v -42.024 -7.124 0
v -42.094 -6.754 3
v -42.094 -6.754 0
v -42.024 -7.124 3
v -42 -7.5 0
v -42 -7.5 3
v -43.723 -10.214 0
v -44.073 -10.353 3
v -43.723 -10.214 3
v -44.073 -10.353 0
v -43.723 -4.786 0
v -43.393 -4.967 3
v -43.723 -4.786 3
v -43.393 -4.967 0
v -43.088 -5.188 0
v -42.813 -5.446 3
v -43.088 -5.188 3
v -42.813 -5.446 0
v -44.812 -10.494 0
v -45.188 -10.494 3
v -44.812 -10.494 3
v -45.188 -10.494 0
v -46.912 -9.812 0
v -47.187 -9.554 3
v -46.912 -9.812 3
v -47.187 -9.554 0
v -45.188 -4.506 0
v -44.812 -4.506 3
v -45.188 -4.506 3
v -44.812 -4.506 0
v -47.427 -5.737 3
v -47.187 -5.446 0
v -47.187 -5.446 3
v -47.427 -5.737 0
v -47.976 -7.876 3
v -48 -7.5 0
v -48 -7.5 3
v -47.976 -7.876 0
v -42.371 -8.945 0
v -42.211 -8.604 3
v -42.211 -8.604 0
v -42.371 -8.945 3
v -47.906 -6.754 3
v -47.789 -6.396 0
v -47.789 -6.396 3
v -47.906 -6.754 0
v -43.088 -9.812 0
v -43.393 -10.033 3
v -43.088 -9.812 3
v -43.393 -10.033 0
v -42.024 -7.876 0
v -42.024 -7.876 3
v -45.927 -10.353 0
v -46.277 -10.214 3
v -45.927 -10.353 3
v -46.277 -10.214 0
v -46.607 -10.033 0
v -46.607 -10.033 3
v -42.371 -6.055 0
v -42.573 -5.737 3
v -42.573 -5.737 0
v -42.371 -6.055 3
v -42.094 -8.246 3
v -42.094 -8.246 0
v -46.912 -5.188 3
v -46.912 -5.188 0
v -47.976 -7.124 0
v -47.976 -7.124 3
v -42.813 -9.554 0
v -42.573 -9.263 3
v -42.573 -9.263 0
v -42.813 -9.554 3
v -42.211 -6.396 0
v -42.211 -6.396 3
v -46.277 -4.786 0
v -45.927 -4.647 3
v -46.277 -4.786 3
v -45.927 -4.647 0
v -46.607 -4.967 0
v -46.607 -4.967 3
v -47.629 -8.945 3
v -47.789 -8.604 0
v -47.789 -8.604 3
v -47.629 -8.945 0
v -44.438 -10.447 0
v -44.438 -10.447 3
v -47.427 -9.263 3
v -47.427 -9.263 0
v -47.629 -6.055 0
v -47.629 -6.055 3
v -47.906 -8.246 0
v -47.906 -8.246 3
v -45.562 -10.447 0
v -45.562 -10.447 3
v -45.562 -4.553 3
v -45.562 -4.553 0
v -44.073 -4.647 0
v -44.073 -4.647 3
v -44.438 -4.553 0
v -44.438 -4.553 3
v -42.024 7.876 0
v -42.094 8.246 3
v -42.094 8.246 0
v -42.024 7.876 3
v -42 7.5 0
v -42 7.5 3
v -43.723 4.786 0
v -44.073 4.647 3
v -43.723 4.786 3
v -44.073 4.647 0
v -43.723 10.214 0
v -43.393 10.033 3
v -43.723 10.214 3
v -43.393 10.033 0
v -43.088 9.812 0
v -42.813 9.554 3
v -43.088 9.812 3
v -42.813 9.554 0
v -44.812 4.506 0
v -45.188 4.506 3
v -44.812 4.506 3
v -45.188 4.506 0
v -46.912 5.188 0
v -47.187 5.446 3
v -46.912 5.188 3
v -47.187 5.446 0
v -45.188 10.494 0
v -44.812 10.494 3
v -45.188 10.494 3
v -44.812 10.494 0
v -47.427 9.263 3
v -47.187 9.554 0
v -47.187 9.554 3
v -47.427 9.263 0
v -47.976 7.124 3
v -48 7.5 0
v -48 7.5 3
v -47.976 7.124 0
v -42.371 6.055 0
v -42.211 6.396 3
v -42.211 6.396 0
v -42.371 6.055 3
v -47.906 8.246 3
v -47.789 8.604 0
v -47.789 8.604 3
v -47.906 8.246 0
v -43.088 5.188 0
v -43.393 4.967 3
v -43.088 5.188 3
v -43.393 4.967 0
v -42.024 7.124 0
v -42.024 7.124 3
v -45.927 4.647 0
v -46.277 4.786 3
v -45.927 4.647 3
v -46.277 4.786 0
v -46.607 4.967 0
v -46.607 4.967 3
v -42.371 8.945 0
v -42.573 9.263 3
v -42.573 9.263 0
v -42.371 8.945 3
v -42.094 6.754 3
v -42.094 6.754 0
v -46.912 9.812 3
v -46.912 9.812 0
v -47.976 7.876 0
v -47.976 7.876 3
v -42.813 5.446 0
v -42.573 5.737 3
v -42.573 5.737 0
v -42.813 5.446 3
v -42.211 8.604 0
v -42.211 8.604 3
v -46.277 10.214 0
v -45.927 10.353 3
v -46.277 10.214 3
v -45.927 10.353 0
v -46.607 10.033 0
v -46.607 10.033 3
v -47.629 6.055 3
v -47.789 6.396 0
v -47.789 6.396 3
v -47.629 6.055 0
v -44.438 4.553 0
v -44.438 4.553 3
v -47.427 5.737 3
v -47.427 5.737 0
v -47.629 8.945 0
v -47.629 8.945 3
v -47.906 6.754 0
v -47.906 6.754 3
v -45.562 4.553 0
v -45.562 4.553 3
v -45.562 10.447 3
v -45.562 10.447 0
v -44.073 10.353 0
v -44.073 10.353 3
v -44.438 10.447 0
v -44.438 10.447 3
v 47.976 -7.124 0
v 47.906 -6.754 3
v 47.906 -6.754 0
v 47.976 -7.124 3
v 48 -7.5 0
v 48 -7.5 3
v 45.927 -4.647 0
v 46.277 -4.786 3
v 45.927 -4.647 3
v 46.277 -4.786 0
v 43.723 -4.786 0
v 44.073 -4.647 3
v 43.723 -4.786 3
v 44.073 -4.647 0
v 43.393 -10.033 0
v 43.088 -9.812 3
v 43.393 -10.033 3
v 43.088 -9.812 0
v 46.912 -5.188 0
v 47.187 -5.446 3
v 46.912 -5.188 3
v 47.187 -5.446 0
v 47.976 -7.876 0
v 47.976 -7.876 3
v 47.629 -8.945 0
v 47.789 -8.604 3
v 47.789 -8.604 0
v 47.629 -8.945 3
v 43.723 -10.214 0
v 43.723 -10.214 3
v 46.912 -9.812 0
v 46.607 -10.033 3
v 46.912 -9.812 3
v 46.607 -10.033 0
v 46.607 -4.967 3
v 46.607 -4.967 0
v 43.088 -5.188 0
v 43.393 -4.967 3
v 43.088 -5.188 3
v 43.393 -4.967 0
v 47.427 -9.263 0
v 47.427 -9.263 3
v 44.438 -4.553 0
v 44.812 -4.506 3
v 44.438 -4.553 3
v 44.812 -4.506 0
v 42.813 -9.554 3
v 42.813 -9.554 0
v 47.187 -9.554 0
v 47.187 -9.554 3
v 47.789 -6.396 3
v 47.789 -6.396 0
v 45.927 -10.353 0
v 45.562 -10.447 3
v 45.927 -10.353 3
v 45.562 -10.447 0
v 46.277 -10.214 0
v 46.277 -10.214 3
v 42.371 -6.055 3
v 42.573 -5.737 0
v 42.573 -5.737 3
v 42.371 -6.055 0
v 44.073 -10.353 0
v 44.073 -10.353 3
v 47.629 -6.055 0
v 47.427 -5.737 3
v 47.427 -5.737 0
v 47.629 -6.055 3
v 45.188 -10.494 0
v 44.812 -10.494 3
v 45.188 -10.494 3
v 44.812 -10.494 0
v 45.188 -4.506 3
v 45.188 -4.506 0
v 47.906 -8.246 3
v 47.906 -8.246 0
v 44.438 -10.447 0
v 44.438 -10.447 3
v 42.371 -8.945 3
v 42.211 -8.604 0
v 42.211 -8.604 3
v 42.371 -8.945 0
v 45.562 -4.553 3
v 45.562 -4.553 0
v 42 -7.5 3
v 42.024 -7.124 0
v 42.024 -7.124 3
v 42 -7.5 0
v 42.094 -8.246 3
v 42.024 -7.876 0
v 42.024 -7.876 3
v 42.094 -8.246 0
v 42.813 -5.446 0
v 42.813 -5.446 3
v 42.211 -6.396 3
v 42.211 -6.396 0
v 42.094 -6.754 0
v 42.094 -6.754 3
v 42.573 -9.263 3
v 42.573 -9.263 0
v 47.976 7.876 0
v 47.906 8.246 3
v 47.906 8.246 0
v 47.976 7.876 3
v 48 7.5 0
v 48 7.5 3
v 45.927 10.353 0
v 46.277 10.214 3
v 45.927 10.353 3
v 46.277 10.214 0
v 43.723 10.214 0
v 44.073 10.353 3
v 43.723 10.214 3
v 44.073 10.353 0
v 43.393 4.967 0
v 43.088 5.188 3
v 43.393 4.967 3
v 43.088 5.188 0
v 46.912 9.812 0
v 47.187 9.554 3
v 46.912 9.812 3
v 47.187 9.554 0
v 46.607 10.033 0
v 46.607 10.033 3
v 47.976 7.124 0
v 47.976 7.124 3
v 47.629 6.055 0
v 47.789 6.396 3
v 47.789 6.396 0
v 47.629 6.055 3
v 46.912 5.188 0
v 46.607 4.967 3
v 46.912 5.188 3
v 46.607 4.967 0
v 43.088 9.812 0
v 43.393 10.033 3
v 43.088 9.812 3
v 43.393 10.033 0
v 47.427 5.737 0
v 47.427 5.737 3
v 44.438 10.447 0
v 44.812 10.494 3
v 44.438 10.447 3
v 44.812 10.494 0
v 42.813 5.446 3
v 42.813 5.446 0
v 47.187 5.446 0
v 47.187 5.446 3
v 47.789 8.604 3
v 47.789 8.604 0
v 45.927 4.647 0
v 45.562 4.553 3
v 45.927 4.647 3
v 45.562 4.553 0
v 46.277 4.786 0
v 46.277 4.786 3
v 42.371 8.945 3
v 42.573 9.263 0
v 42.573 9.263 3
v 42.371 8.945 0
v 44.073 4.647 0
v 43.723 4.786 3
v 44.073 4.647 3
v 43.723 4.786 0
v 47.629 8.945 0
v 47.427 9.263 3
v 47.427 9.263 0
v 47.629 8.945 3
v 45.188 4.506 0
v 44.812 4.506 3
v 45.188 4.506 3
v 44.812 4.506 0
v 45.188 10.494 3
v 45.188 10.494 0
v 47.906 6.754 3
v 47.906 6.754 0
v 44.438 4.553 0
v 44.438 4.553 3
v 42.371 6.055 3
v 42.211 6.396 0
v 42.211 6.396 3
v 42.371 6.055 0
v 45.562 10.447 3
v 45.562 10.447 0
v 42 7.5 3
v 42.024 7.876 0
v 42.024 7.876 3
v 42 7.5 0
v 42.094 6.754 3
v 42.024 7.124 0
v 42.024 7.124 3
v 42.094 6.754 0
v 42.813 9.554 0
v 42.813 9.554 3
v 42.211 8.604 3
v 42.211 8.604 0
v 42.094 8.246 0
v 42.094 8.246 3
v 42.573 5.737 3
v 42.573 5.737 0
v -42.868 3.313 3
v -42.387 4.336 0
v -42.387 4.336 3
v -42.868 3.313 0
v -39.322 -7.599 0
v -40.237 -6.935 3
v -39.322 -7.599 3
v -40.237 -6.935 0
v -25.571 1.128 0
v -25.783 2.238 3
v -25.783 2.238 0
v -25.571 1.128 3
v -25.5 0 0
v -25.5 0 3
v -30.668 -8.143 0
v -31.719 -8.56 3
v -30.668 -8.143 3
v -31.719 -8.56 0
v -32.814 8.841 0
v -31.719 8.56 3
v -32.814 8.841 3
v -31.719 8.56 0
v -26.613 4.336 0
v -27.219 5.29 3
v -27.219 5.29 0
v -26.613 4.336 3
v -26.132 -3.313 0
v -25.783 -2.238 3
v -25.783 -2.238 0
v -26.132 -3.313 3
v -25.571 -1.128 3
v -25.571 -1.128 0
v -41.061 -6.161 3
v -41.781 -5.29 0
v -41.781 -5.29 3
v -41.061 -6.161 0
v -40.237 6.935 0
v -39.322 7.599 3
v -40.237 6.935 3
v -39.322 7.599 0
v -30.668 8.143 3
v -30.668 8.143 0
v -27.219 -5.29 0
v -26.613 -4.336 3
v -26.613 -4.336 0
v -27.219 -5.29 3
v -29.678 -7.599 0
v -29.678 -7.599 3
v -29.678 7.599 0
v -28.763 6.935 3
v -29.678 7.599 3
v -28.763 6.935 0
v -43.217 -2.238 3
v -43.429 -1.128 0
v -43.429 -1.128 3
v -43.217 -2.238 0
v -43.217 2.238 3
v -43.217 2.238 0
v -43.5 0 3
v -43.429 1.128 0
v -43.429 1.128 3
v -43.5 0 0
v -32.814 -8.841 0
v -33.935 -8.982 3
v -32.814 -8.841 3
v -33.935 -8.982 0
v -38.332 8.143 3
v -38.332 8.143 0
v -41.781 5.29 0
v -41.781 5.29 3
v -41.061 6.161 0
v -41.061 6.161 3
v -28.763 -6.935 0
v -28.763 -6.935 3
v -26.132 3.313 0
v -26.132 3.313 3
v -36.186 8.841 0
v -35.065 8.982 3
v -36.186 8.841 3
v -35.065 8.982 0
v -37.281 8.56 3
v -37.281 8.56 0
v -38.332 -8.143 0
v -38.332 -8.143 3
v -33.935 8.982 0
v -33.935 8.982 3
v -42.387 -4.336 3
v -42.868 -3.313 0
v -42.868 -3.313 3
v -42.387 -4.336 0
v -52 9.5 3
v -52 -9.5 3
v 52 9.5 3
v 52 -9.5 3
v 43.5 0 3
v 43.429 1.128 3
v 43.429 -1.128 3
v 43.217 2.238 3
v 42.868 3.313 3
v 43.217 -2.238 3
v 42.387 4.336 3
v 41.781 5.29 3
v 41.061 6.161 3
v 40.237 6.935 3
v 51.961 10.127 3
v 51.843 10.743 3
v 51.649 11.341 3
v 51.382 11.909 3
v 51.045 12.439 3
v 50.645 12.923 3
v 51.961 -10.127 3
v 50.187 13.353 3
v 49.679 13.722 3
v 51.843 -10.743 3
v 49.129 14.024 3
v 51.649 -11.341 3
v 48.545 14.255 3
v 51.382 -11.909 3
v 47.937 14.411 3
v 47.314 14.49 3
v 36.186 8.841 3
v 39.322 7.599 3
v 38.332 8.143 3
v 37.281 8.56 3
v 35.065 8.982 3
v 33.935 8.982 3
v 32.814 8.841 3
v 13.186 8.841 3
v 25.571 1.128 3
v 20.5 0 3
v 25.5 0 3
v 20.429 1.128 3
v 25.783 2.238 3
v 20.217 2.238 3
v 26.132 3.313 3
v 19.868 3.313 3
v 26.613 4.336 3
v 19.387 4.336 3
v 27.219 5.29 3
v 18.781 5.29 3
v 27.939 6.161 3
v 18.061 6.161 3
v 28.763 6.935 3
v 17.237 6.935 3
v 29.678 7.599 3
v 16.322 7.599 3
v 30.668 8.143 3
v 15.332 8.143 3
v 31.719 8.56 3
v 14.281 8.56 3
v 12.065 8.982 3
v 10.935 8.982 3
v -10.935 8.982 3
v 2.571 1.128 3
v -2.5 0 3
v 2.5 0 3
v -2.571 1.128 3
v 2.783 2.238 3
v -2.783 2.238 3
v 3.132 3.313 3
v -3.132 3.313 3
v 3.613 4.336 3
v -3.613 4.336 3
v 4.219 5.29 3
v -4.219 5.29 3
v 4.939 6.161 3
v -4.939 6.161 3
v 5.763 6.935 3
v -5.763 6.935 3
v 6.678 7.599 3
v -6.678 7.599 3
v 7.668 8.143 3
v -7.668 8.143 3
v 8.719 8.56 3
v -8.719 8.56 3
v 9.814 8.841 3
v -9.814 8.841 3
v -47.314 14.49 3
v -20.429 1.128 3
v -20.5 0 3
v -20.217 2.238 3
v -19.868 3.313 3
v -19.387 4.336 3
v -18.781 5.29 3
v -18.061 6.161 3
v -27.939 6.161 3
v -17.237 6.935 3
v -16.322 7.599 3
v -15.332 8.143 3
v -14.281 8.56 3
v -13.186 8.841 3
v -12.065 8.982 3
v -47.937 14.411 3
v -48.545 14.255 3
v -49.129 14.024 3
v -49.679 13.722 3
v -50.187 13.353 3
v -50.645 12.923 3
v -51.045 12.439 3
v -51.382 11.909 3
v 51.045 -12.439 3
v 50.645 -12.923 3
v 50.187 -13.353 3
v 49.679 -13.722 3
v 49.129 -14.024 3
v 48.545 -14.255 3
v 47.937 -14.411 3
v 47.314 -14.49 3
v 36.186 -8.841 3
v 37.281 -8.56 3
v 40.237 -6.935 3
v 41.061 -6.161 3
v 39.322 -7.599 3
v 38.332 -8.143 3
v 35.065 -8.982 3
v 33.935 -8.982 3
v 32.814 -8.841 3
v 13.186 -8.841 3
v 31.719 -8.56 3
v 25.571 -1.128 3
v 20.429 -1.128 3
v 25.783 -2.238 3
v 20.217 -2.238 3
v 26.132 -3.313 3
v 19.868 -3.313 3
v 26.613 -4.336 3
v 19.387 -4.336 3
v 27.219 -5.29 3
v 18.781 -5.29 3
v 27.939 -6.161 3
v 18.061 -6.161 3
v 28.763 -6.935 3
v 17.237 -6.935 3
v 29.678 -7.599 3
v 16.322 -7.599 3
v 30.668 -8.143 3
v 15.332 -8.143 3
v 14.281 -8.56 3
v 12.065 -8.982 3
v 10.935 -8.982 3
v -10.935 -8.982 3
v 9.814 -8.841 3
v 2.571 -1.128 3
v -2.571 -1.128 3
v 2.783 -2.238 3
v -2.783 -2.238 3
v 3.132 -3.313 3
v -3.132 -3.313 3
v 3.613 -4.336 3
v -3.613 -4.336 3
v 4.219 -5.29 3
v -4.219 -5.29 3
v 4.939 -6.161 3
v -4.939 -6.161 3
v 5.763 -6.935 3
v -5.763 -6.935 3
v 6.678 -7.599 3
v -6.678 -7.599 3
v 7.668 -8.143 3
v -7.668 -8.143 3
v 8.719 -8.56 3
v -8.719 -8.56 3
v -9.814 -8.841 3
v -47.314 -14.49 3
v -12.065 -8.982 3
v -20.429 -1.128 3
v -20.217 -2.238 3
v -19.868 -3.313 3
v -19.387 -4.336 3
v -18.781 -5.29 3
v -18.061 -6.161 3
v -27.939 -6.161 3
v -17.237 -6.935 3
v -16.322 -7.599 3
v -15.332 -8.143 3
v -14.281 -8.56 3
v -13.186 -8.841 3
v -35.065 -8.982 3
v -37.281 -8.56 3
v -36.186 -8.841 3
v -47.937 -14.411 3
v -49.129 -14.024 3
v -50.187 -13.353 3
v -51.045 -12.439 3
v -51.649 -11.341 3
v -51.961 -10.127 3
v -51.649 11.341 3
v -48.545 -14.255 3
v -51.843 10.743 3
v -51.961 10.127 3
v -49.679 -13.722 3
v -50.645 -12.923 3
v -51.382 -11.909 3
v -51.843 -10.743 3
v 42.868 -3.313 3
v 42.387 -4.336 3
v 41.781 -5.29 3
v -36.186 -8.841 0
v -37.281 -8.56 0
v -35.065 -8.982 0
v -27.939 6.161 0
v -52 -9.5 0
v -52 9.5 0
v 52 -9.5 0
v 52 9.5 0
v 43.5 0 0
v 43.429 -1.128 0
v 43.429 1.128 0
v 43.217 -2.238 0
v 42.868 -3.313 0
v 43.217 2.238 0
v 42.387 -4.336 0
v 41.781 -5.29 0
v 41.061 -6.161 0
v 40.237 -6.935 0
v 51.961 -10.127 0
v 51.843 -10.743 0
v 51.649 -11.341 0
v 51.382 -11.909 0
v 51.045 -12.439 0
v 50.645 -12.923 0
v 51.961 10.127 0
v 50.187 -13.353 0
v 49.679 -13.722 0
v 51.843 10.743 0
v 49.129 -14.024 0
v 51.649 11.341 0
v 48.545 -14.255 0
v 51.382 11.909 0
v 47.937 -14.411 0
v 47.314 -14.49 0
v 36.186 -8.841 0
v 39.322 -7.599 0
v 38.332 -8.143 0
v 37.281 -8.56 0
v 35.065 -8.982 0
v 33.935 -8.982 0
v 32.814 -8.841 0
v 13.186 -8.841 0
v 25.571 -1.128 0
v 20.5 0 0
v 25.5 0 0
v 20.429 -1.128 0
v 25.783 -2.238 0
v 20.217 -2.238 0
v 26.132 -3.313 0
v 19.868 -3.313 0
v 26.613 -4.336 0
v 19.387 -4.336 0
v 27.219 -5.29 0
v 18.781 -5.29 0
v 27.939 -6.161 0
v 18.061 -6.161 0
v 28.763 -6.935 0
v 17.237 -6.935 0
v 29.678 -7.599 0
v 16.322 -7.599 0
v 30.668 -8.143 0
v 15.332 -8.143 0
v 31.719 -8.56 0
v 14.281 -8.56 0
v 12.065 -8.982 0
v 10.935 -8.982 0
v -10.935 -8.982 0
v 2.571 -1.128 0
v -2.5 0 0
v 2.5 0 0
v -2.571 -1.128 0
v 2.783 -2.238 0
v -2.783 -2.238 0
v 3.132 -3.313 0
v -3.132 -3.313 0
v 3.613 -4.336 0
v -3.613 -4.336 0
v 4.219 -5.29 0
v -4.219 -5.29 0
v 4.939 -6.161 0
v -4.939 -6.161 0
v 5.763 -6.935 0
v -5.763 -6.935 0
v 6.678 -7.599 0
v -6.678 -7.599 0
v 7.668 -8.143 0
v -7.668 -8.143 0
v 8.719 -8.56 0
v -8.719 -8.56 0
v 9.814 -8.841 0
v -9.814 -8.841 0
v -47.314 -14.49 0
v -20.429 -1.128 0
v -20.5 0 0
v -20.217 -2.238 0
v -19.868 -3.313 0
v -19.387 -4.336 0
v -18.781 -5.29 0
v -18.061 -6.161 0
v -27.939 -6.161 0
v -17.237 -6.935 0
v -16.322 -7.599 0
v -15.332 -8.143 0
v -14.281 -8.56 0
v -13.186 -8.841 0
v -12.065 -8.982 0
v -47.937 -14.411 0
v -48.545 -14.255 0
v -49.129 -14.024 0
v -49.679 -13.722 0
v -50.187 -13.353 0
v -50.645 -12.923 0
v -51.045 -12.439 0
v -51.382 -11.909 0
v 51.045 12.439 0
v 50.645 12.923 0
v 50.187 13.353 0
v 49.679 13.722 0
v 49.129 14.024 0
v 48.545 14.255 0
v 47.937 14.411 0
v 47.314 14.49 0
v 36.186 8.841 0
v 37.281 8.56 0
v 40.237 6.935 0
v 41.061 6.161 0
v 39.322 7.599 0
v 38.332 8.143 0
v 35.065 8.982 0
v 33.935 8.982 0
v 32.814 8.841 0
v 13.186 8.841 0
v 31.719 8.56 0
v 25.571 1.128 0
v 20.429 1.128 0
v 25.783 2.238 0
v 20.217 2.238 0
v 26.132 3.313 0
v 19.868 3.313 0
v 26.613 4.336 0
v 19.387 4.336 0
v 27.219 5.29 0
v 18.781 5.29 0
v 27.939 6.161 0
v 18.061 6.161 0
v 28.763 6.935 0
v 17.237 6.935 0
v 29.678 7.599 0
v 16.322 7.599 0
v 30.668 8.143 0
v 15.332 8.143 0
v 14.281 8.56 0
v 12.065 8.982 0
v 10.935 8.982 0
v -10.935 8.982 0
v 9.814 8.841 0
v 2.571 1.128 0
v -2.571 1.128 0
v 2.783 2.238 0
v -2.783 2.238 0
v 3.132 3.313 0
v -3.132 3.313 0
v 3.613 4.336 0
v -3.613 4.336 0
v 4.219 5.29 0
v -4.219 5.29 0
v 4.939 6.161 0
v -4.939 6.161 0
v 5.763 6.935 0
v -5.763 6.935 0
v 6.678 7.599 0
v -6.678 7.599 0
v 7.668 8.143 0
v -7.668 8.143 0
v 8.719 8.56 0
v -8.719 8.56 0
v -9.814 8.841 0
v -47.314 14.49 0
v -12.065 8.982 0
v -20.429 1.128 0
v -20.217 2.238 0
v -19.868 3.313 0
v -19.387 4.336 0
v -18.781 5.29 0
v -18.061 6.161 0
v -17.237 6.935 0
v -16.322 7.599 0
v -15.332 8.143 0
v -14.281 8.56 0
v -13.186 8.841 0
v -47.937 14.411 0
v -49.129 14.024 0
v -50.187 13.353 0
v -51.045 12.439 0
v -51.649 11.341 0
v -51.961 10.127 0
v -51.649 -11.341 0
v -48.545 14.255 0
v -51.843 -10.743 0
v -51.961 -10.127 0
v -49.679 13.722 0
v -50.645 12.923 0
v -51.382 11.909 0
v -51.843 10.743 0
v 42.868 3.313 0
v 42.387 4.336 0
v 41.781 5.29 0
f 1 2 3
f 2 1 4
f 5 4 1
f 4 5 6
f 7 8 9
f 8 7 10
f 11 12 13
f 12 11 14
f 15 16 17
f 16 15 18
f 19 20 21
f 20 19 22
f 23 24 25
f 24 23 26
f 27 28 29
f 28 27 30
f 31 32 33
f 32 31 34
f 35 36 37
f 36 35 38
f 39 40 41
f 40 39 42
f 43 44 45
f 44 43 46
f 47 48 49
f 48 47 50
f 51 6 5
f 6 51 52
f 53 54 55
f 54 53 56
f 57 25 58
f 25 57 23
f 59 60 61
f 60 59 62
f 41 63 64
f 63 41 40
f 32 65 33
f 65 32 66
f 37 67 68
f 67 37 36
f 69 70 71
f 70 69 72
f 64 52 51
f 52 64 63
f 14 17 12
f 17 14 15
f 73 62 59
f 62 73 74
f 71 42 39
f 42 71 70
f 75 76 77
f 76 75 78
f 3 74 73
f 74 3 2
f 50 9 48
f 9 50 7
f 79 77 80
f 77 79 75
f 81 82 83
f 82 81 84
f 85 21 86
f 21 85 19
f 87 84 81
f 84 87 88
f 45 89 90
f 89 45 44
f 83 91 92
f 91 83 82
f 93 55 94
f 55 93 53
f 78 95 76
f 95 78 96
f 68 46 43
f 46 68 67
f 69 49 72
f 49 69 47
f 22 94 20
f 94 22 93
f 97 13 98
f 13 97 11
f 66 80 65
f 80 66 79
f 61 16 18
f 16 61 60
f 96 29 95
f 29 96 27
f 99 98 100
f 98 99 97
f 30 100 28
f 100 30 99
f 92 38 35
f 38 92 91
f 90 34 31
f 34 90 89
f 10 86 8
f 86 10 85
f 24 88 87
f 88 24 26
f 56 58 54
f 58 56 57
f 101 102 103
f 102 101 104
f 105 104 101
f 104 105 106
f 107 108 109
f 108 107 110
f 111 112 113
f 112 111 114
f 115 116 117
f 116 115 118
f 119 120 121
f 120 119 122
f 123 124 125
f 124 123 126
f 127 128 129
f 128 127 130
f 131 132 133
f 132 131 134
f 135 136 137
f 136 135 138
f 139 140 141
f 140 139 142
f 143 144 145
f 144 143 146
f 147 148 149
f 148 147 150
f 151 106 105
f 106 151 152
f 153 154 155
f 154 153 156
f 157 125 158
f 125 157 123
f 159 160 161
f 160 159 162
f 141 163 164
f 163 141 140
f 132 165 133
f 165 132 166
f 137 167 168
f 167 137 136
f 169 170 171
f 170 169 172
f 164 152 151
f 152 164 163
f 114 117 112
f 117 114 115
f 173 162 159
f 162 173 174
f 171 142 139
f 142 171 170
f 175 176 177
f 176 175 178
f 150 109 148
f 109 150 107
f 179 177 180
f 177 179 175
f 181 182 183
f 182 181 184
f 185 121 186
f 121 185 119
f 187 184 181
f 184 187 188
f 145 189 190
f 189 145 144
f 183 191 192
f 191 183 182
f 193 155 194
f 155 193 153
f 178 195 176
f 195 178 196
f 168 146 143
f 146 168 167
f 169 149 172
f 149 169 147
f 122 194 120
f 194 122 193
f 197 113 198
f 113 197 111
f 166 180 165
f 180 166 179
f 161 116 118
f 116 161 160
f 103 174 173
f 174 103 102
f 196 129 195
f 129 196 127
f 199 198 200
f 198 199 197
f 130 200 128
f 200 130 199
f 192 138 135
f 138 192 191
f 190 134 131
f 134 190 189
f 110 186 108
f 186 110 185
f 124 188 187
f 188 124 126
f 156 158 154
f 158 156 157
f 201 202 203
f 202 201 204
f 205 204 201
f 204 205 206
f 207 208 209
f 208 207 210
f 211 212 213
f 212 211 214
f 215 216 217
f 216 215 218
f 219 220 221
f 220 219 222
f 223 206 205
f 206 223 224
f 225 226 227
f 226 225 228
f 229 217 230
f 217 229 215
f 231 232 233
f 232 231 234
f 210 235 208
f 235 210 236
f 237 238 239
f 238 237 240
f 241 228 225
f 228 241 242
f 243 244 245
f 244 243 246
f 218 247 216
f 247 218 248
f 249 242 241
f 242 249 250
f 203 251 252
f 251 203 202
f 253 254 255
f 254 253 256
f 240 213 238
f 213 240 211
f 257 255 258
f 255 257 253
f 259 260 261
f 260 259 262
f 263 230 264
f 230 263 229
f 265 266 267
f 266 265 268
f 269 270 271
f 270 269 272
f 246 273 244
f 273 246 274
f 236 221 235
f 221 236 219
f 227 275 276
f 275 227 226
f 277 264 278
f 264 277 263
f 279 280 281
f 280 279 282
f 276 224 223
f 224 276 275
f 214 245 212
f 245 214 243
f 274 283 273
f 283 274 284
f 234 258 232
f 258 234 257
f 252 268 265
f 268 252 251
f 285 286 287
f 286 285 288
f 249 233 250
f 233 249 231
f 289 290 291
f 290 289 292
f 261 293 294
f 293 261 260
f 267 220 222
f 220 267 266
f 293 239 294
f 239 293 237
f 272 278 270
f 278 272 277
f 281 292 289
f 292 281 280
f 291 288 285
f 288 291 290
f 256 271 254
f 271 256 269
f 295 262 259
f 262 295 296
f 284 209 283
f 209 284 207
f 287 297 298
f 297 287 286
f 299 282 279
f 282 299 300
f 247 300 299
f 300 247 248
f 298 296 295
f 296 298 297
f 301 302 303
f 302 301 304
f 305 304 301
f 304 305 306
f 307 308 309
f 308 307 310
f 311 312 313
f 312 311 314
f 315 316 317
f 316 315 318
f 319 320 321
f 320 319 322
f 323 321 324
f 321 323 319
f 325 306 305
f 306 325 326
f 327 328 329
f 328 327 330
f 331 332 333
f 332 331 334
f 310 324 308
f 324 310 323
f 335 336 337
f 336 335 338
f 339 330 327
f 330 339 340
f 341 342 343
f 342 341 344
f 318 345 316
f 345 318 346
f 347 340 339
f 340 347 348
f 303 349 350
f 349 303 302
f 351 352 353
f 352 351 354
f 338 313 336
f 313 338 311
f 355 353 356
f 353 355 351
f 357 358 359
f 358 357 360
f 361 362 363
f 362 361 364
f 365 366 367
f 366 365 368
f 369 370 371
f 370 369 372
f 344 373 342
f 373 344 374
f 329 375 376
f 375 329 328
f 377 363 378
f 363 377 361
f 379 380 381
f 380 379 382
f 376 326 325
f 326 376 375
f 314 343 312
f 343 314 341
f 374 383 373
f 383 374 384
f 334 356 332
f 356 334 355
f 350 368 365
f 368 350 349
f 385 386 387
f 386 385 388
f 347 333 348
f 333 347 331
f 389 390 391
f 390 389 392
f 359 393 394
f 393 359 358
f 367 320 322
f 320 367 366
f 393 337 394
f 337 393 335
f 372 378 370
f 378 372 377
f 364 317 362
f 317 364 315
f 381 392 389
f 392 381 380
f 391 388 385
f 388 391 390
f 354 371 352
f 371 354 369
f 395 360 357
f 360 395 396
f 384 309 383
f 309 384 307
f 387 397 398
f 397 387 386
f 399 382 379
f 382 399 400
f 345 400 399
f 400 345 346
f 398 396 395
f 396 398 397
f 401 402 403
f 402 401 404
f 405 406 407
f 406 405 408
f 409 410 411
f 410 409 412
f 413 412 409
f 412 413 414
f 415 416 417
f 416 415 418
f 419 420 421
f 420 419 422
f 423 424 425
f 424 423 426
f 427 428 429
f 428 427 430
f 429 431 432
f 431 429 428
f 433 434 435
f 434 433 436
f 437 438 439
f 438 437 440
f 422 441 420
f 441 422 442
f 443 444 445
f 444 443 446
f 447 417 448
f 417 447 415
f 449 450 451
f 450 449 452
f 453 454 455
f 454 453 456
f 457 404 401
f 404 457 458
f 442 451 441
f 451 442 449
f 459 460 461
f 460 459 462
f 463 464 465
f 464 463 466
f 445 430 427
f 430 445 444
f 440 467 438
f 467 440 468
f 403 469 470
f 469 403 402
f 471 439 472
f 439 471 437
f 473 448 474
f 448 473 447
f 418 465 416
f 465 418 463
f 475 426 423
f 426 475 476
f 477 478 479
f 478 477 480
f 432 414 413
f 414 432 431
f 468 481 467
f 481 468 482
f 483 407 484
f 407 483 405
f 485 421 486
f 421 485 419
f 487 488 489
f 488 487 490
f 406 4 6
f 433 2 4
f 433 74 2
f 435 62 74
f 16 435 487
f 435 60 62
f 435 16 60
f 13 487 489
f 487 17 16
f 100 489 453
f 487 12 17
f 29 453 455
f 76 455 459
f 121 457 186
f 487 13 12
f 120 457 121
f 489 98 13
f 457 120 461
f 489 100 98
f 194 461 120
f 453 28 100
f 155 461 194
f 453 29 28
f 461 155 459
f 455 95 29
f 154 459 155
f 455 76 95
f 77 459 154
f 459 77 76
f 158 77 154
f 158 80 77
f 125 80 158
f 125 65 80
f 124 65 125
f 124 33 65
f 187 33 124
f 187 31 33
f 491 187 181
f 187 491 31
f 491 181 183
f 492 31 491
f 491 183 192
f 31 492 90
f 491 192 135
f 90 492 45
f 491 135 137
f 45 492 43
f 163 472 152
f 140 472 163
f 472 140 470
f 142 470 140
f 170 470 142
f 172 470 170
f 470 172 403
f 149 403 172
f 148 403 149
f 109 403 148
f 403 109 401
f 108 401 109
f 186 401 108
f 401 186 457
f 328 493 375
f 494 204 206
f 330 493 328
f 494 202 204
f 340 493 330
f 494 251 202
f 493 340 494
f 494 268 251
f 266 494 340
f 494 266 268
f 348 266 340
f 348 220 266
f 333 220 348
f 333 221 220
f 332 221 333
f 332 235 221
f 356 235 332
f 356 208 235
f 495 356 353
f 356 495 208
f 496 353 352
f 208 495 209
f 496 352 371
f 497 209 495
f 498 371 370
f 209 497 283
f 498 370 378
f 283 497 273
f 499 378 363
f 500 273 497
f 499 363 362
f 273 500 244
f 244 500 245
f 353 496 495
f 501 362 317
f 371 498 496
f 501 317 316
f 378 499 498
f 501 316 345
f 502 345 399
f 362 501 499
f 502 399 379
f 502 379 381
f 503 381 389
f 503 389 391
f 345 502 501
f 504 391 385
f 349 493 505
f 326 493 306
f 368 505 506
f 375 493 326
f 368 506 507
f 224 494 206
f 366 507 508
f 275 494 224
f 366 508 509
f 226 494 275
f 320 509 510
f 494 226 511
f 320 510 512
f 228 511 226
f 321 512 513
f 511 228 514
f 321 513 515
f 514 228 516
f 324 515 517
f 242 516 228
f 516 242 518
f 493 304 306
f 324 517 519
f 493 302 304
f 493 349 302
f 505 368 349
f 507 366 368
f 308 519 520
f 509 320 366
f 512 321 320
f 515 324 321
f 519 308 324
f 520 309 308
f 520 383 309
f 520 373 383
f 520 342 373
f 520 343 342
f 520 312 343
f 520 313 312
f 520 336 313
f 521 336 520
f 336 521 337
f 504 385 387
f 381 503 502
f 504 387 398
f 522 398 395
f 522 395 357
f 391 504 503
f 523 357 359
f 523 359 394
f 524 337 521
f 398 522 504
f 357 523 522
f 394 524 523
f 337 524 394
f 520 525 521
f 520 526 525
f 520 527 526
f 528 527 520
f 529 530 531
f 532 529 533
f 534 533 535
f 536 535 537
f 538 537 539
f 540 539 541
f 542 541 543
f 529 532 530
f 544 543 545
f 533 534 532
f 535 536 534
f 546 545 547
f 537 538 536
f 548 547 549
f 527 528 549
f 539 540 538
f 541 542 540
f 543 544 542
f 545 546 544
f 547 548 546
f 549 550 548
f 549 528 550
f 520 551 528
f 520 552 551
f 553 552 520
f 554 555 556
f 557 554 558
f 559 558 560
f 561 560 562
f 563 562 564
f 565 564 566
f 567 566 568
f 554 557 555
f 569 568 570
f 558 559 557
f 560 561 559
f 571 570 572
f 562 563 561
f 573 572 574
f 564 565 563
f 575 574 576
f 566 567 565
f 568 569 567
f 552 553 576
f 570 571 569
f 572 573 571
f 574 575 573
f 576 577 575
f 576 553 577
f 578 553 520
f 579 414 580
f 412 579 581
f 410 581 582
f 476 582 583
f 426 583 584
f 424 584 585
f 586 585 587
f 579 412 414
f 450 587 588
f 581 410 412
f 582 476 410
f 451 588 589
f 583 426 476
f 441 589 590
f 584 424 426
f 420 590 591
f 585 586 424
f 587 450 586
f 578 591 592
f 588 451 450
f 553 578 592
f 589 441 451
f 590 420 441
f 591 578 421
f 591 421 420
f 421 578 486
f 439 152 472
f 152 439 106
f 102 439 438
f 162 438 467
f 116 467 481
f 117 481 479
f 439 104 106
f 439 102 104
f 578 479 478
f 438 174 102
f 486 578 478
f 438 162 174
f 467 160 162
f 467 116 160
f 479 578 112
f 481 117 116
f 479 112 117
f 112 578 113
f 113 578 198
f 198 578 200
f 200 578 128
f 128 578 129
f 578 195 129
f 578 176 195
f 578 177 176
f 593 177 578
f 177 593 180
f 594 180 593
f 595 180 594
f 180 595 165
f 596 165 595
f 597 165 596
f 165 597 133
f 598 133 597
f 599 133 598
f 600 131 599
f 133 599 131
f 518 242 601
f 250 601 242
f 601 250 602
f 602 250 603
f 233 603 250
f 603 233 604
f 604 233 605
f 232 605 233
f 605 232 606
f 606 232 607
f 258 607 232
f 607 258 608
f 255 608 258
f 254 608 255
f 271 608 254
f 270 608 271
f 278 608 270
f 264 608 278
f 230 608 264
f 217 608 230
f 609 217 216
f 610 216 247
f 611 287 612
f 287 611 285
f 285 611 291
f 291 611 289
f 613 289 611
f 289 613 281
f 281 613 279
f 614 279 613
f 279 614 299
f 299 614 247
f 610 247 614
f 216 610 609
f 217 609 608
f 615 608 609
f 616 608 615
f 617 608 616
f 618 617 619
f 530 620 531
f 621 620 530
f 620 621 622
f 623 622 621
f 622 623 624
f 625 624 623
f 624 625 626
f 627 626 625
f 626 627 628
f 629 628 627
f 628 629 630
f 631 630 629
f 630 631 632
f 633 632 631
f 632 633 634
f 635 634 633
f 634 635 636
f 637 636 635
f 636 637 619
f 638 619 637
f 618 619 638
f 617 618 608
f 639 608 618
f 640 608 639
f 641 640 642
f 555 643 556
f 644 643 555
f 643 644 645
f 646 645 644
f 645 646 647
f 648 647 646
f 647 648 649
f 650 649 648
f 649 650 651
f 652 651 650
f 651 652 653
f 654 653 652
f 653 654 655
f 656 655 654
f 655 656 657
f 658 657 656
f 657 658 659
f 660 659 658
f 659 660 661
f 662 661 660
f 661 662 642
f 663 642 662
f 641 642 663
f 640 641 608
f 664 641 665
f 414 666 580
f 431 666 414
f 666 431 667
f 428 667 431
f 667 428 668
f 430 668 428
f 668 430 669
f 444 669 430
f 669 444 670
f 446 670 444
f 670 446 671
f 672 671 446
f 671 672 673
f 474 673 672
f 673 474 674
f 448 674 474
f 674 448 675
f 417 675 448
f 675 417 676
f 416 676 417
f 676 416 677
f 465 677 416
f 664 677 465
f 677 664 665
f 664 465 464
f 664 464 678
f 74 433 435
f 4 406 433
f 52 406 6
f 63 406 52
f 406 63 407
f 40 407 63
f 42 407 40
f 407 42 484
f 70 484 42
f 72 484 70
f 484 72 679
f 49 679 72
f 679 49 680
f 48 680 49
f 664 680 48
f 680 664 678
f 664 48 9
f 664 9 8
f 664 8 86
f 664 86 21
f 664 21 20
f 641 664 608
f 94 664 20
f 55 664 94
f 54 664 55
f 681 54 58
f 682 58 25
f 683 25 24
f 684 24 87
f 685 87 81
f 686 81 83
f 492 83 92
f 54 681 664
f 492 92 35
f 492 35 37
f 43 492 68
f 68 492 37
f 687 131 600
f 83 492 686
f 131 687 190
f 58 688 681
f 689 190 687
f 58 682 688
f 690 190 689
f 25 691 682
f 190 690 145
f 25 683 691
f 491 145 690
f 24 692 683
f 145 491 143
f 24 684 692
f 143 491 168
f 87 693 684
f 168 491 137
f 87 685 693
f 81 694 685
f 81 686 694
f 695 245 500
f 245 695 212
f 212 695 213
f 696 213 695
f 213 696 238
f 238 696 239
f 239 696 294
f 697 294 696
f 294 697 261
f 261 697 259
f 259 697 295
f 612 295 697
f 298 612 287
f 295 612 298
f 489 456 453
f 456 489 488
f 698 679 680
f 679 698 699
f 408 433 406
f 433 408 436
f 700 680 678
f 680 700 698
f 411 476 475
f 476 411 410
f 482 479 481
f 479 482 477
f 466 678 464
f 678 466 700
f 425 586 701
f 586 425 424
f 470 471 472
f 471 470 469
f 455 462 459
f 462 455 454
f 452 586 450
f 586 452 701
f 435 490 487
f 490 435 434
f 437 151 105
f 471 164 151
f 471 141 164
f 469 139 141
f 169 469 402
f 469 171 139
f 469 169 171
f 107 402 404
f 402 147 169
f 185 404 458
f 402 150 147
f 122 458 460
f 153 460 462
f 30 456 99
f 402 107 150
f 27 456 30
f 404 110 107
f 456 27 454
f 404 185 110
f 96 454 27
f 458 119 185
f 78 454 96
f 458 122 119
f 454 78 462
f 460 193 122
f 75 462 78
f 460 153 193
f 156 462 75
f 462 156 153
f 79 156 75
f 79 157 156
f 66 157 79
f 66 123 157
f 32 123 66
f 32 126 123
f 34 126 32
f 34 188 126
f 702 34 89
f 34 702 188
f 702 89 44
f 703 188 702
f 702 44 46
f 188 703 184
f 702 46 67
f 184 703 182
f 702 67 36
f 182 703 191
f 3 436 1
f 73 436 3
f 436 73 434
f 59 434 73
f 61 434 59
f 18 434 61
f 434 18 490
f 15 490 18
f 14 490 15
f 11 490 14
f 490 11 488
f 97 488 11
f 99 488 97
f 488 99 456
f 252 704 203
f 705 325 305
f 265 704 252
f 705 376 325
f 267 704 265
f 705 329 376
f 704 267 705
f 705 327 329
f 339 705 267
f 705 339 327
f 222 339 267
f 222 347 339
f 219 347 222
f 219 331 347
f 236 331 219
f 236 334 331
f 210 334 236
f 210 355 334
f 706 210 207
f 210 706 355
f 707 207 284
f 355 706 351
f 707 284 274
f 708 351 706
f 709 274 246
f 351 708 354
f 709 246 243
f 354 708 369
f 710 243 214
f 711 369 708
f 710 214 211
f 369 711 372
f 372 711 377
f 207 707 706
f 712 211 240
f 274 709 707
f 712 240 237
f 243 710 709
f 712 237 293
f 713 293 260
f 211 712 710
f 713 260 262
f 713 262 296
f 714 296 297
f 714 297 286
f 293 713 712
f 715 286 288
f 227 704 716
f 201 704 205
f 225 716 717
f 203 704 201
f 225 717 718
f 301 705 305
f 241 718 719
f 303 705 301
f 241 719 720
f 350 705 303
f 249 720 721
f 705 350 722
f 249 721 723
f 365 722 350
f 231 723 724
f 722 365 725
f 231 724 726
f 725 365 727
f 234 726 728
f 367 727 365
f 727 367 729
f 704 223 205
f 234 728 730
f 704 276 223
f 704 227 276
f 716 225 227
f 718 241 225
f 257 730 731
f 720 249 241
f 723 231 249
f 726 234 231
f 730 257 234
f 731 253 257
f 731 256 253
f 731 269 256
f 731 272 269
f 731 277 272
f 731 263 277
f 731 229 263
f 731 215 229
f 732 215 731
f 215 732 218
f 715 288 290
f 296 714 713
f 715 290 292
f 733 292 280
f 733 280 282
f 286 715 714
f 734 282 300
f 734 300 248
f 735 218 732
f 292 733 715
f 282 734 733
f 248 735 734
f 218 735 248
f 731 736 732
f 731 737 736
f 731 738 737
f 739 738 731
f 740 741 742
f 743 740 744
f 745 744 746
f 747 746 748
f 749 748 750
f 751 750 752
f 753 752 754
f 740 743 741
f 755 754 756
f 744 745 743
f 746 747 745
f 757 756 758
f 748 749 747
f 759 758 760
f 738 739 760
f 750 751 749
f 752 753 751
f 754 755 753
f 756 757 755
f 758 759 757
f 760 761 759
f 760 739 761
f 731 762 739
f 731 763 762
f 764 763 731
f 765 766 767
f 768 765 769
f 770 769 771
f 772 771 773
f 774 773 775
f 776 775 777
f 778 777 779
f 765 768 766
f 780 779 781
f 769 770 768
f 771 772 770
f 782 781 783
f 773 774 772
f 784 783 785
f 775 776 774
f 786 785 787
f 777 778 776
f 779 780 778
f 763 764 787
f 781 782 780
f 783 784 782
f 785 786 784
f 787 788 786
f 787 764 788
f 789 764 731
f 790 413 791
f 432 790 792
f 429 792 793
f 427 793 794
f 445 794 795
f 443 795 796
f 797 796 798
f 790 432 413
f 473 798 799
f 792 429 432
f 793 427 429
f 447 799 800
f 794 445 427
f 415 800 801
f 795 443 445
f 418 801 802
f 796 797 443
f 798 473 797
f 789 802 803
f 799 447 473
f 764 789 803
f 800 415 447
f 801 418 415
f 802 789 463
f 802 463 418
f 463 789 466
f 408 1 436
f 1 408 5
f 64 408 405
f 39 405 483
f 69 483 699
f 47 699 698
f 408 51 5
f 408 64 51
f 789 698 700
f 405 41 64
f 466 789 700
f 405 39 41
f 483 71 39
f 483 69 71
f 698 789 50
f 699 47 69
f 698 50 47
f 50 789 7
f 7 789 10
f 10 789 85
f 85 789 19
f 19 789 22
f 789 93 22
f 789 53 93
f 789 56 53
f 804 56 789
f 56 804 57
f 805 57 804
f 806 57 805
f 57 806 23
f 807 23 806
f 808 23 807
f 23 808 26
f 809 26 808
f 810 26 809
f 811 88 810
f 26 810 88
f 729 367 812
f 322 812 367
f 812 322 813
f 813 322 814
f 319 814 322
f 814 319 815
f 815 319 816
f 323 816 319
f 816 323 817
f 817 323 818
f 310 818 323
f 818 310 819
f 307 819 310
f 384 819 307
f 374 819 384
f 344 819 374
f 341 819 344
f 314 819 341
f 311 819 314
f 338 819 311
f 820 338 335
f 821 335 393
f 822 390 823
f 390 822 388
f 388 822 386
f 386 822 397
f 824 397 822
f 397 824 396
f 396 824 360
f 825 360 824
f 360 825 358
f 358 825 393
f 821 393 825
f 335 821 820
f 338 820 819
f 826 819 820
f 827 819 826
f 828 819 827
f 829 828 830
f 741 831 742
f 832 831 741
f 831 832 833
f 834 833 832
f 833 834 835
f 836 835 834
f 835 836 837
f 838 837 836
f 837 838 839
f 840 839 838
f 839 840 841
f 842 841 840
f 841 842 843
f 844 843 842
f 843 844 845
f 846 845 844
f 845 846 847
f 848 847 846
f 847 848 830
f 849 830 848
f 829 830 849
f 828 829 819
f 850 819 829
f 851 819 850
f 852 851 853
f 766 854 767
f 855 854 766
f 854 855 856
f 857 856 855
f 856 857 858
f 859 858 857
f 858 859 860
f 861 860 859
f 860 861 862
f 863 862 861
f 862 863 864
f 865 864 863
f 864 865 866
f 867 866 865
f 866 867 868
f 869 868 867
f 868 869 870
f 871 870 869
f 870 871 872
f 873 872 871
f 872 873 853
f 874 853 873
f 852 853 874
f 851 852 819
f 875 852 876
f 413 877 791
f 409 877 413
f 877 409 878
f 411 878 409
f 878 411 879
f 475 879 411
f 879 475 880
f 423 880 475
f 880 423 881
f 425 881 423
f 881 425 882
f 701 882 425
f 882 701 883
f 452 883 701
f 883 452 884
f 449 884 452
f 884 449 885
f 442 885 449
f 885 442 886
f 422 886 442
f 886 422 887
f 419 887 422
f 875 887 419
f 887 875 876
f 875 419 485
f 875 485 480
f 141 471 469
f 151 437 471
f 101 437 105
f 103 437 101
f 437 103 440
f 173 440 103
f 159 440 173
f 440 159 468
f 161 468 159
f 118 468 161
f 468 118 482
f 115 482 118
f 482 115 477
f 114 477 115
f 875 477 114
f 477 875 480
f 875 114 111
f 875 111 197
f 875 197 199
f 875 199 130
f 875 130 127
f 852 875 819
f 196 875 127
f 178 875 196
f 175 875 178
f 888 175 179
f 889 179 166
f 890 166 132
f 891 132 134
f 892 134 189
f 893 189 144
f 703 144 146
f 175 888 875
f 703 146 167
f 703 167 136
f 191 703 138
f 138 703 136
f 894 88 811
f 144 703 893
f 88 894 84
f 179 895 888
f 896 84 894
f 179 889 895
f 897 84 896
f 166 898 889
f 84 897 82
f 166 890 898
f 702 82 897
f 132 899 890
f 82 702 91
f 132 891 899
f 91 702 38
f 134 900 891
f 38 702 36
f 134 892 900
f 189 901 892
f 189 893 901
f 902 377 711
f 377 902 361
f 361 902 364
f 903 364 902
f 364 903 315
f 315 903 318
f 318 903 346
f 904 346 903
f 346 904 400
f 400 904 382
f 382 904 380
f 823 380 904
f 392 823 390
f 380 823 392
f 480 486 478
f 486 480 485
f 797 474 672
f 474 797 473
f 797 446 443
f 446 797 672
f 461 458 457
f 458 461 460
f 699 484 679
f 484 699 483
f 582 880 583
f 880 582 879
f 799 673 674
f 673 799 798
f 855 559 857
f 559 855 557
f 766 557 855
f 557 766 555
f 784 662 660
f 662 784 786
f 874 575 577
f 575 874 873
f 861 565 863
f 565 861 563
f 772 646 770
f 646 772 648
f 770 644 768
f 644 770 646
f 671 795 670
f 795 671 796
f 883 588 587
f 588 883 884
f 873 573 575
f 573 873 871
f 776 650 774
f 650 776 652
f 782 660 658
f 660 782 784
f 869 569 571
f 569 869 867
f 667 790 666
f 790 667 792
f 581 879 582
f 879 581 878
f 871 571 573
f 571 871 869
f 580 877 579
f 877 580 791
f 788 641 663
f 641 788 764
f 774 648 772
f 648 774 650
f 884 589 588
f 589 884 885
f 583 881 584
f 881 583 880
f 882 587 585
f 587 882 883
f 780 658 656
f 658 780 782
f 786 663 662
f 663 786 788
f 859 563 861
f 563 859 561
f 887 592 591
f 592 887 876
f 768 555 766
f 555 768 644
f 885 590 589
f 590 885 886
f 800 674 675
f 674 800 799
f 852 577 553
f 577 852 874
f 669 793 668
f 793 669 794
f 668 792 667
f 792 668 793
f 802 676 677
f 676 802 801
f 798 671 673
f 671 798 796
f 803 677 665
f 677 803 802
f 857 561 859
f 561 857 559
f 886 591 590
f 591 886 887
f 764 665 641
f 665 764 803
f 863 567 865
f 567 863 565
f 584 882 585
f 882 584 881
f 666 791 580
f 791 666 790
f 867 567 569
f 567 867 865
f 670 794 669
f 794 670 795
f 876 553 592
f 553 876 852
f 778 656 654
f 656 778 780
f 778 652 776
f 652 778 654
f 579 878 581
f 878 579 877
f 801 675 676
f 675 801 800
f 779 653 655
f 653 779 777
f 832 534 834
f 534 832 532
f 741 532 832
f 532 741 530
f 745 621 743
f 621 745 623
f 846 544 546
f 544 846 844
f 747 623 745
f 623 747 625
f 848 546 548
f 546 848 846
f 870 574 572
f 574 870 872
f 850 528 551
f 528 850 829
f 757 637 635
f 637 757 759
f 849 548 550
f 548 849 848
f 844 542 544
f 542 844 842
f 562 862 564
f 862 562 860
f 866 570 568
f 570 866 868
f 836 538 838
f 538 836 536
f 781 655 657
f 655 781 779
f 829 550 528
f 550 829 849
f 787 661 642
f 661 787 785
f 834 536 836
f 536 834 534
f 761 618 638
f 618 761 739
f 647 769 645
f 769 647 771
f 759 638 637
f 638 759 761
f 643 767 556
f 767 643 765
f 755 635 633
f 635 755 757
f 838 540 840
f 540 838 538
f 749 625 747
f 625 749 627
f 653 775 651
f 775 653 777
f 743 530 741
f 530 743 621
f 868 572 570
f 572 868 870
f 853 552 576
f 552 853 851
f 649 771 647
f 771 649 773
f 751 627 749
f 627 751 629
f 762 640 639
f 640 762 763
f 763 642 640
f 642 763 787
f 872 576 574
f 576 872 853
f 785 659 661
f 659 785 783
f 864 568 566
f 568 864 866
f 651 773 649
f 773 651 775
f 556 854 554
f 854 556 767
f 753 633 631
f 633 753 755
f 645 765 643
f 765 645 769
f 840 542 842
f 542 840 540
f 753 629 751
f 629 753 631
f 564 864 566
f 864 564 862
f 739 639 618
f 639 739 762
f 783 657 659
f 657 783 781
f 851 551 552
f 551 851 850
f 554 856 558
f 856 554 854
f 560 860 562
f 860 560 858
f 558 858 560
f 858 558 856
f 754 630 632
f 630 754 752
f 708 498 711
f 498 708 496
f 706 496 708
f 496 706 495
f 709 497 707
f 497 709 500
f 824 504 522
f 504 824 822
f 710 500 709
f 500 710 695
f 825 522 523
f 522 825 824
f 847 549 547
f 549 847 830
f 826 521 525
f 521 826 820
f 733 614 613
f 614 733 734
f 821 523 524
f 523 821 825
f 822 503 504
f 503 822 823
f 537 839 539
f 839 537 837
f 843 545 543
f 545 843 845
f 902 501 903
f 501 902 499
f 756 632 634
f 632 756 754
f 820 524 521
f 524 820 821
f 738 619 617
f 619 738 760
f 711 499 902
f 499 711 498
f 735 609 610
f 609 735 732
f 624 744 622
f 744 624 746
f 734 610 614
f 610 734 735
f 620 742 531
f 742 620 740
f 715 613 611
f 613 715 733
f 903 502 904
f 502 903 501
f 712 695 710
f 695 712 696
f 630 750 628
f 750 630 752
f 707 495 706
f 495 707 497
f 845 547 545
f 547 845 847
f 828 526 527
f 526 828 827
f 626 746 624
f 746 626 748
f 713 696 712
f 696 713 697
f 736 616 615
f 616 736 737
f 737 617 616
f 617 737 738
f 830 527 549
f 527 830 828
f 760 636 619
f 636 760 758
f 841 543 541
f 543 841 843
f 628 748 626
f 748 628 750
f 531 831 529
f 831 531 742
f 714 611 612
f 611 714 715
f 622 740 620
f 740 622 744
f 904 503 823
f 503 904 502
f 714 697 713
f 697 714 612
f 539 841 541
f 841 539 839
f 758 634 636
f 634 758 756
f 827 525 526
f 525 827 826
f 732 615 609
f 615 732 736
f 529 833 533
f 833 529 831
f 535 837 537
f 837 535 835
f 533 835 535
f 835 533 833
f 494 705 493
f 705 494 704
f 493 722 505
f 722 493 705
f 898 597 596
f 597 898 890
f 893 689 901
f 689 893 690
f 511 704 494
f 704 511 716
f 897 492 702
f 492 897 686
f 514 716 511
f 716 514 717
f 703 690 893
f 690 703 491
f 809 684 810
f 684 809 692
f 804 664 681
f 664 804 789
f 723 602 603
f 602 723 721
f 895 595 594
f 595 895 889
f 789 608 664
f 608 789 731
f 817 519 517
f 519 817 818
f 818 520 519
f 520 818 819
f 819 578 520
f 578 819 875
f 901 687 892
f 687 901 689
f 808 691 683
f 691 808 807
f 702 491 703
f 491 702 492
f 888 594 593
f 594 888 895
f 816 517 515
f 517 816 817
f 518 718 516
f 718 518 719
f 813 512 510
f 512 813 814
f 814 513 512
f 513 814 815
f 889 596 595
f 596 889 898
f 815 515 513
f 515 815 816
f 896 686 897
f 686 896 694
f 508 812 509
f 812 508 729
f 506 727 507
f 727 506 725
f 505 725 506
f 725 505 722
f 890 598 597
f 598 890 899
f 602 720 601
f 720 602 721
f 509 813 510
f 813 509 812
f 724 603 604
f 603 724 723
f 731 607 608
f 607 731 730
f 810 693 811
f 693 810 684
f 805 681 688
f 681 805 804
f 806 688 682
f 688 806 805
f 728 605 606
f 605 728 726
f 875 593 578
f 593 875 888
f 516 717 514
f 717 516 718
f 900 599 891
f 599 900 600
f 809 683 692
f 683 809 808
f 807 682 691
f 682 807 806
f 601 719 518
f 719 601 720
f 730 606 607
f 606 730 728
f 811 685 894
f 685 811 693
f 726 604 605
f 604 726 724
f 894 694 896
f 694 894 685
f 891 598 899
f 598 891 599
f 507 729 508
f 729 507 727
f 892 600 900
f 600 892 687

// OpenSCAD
$fn = 50;


difference() {
	union() {
		hull() {
			translate(v = [-47.0000000000, 9.5000000000, 0]) {
				cylinder(h = 3, r = 5);
			}
			translate(v = [47.0000000000, 9.5000000000, 0]) {
				cylinder(h = 3, r = 5);
			}
			translate(v = [-47.0000000000, -9.5000000000, 0]) {
				cylinder(h = 3, r = 5);
			}
			translate(v = [47.0000000000, -9.5000000000, 0]) {
				cylinder(h = 3, r = 5);
			}
		}
	}
	union() {
		#translate(v = [-45.0000000000, -7.5000000000, -100.0000000000]) {
			cylinder(h = 200, r = 3.0000000000);
		}
		#translate(v = [-45.0000000000, 7.5000000000, -100.0000000000]) {
			cylinder(h = 200, r = 3.0000000000);
		}
		#translate(v = [45.0000000000, -7.5000000000, -100.0000000000]) {
			cylinder(h = 200, r = 3.0000000000);
		}
		#translate(v = [45.0000000000, 7.5000000000, -100.0000000000]) {
			cylinder(h = 200, r = 3.0000000000);
		}
		#translate(v = [-34.5000000000, 0, 0]) {
			cylinder(h = 3, r = 9.0000000000);
		}
		#translate(v = [-11.5000000000, 0, 0]) {
			cylinder(h = 3, r = 9.0000000000);
		}
		#translate(v = [11.5000000000, 0, 0]) {
			cylinder(h = 3, r = 9.0000000000);
		}
		#translate(v = [34.5000000000, 0, 0]) {
			cylinder(h = 3, r = 9.0000000000);
		}
	}
}
